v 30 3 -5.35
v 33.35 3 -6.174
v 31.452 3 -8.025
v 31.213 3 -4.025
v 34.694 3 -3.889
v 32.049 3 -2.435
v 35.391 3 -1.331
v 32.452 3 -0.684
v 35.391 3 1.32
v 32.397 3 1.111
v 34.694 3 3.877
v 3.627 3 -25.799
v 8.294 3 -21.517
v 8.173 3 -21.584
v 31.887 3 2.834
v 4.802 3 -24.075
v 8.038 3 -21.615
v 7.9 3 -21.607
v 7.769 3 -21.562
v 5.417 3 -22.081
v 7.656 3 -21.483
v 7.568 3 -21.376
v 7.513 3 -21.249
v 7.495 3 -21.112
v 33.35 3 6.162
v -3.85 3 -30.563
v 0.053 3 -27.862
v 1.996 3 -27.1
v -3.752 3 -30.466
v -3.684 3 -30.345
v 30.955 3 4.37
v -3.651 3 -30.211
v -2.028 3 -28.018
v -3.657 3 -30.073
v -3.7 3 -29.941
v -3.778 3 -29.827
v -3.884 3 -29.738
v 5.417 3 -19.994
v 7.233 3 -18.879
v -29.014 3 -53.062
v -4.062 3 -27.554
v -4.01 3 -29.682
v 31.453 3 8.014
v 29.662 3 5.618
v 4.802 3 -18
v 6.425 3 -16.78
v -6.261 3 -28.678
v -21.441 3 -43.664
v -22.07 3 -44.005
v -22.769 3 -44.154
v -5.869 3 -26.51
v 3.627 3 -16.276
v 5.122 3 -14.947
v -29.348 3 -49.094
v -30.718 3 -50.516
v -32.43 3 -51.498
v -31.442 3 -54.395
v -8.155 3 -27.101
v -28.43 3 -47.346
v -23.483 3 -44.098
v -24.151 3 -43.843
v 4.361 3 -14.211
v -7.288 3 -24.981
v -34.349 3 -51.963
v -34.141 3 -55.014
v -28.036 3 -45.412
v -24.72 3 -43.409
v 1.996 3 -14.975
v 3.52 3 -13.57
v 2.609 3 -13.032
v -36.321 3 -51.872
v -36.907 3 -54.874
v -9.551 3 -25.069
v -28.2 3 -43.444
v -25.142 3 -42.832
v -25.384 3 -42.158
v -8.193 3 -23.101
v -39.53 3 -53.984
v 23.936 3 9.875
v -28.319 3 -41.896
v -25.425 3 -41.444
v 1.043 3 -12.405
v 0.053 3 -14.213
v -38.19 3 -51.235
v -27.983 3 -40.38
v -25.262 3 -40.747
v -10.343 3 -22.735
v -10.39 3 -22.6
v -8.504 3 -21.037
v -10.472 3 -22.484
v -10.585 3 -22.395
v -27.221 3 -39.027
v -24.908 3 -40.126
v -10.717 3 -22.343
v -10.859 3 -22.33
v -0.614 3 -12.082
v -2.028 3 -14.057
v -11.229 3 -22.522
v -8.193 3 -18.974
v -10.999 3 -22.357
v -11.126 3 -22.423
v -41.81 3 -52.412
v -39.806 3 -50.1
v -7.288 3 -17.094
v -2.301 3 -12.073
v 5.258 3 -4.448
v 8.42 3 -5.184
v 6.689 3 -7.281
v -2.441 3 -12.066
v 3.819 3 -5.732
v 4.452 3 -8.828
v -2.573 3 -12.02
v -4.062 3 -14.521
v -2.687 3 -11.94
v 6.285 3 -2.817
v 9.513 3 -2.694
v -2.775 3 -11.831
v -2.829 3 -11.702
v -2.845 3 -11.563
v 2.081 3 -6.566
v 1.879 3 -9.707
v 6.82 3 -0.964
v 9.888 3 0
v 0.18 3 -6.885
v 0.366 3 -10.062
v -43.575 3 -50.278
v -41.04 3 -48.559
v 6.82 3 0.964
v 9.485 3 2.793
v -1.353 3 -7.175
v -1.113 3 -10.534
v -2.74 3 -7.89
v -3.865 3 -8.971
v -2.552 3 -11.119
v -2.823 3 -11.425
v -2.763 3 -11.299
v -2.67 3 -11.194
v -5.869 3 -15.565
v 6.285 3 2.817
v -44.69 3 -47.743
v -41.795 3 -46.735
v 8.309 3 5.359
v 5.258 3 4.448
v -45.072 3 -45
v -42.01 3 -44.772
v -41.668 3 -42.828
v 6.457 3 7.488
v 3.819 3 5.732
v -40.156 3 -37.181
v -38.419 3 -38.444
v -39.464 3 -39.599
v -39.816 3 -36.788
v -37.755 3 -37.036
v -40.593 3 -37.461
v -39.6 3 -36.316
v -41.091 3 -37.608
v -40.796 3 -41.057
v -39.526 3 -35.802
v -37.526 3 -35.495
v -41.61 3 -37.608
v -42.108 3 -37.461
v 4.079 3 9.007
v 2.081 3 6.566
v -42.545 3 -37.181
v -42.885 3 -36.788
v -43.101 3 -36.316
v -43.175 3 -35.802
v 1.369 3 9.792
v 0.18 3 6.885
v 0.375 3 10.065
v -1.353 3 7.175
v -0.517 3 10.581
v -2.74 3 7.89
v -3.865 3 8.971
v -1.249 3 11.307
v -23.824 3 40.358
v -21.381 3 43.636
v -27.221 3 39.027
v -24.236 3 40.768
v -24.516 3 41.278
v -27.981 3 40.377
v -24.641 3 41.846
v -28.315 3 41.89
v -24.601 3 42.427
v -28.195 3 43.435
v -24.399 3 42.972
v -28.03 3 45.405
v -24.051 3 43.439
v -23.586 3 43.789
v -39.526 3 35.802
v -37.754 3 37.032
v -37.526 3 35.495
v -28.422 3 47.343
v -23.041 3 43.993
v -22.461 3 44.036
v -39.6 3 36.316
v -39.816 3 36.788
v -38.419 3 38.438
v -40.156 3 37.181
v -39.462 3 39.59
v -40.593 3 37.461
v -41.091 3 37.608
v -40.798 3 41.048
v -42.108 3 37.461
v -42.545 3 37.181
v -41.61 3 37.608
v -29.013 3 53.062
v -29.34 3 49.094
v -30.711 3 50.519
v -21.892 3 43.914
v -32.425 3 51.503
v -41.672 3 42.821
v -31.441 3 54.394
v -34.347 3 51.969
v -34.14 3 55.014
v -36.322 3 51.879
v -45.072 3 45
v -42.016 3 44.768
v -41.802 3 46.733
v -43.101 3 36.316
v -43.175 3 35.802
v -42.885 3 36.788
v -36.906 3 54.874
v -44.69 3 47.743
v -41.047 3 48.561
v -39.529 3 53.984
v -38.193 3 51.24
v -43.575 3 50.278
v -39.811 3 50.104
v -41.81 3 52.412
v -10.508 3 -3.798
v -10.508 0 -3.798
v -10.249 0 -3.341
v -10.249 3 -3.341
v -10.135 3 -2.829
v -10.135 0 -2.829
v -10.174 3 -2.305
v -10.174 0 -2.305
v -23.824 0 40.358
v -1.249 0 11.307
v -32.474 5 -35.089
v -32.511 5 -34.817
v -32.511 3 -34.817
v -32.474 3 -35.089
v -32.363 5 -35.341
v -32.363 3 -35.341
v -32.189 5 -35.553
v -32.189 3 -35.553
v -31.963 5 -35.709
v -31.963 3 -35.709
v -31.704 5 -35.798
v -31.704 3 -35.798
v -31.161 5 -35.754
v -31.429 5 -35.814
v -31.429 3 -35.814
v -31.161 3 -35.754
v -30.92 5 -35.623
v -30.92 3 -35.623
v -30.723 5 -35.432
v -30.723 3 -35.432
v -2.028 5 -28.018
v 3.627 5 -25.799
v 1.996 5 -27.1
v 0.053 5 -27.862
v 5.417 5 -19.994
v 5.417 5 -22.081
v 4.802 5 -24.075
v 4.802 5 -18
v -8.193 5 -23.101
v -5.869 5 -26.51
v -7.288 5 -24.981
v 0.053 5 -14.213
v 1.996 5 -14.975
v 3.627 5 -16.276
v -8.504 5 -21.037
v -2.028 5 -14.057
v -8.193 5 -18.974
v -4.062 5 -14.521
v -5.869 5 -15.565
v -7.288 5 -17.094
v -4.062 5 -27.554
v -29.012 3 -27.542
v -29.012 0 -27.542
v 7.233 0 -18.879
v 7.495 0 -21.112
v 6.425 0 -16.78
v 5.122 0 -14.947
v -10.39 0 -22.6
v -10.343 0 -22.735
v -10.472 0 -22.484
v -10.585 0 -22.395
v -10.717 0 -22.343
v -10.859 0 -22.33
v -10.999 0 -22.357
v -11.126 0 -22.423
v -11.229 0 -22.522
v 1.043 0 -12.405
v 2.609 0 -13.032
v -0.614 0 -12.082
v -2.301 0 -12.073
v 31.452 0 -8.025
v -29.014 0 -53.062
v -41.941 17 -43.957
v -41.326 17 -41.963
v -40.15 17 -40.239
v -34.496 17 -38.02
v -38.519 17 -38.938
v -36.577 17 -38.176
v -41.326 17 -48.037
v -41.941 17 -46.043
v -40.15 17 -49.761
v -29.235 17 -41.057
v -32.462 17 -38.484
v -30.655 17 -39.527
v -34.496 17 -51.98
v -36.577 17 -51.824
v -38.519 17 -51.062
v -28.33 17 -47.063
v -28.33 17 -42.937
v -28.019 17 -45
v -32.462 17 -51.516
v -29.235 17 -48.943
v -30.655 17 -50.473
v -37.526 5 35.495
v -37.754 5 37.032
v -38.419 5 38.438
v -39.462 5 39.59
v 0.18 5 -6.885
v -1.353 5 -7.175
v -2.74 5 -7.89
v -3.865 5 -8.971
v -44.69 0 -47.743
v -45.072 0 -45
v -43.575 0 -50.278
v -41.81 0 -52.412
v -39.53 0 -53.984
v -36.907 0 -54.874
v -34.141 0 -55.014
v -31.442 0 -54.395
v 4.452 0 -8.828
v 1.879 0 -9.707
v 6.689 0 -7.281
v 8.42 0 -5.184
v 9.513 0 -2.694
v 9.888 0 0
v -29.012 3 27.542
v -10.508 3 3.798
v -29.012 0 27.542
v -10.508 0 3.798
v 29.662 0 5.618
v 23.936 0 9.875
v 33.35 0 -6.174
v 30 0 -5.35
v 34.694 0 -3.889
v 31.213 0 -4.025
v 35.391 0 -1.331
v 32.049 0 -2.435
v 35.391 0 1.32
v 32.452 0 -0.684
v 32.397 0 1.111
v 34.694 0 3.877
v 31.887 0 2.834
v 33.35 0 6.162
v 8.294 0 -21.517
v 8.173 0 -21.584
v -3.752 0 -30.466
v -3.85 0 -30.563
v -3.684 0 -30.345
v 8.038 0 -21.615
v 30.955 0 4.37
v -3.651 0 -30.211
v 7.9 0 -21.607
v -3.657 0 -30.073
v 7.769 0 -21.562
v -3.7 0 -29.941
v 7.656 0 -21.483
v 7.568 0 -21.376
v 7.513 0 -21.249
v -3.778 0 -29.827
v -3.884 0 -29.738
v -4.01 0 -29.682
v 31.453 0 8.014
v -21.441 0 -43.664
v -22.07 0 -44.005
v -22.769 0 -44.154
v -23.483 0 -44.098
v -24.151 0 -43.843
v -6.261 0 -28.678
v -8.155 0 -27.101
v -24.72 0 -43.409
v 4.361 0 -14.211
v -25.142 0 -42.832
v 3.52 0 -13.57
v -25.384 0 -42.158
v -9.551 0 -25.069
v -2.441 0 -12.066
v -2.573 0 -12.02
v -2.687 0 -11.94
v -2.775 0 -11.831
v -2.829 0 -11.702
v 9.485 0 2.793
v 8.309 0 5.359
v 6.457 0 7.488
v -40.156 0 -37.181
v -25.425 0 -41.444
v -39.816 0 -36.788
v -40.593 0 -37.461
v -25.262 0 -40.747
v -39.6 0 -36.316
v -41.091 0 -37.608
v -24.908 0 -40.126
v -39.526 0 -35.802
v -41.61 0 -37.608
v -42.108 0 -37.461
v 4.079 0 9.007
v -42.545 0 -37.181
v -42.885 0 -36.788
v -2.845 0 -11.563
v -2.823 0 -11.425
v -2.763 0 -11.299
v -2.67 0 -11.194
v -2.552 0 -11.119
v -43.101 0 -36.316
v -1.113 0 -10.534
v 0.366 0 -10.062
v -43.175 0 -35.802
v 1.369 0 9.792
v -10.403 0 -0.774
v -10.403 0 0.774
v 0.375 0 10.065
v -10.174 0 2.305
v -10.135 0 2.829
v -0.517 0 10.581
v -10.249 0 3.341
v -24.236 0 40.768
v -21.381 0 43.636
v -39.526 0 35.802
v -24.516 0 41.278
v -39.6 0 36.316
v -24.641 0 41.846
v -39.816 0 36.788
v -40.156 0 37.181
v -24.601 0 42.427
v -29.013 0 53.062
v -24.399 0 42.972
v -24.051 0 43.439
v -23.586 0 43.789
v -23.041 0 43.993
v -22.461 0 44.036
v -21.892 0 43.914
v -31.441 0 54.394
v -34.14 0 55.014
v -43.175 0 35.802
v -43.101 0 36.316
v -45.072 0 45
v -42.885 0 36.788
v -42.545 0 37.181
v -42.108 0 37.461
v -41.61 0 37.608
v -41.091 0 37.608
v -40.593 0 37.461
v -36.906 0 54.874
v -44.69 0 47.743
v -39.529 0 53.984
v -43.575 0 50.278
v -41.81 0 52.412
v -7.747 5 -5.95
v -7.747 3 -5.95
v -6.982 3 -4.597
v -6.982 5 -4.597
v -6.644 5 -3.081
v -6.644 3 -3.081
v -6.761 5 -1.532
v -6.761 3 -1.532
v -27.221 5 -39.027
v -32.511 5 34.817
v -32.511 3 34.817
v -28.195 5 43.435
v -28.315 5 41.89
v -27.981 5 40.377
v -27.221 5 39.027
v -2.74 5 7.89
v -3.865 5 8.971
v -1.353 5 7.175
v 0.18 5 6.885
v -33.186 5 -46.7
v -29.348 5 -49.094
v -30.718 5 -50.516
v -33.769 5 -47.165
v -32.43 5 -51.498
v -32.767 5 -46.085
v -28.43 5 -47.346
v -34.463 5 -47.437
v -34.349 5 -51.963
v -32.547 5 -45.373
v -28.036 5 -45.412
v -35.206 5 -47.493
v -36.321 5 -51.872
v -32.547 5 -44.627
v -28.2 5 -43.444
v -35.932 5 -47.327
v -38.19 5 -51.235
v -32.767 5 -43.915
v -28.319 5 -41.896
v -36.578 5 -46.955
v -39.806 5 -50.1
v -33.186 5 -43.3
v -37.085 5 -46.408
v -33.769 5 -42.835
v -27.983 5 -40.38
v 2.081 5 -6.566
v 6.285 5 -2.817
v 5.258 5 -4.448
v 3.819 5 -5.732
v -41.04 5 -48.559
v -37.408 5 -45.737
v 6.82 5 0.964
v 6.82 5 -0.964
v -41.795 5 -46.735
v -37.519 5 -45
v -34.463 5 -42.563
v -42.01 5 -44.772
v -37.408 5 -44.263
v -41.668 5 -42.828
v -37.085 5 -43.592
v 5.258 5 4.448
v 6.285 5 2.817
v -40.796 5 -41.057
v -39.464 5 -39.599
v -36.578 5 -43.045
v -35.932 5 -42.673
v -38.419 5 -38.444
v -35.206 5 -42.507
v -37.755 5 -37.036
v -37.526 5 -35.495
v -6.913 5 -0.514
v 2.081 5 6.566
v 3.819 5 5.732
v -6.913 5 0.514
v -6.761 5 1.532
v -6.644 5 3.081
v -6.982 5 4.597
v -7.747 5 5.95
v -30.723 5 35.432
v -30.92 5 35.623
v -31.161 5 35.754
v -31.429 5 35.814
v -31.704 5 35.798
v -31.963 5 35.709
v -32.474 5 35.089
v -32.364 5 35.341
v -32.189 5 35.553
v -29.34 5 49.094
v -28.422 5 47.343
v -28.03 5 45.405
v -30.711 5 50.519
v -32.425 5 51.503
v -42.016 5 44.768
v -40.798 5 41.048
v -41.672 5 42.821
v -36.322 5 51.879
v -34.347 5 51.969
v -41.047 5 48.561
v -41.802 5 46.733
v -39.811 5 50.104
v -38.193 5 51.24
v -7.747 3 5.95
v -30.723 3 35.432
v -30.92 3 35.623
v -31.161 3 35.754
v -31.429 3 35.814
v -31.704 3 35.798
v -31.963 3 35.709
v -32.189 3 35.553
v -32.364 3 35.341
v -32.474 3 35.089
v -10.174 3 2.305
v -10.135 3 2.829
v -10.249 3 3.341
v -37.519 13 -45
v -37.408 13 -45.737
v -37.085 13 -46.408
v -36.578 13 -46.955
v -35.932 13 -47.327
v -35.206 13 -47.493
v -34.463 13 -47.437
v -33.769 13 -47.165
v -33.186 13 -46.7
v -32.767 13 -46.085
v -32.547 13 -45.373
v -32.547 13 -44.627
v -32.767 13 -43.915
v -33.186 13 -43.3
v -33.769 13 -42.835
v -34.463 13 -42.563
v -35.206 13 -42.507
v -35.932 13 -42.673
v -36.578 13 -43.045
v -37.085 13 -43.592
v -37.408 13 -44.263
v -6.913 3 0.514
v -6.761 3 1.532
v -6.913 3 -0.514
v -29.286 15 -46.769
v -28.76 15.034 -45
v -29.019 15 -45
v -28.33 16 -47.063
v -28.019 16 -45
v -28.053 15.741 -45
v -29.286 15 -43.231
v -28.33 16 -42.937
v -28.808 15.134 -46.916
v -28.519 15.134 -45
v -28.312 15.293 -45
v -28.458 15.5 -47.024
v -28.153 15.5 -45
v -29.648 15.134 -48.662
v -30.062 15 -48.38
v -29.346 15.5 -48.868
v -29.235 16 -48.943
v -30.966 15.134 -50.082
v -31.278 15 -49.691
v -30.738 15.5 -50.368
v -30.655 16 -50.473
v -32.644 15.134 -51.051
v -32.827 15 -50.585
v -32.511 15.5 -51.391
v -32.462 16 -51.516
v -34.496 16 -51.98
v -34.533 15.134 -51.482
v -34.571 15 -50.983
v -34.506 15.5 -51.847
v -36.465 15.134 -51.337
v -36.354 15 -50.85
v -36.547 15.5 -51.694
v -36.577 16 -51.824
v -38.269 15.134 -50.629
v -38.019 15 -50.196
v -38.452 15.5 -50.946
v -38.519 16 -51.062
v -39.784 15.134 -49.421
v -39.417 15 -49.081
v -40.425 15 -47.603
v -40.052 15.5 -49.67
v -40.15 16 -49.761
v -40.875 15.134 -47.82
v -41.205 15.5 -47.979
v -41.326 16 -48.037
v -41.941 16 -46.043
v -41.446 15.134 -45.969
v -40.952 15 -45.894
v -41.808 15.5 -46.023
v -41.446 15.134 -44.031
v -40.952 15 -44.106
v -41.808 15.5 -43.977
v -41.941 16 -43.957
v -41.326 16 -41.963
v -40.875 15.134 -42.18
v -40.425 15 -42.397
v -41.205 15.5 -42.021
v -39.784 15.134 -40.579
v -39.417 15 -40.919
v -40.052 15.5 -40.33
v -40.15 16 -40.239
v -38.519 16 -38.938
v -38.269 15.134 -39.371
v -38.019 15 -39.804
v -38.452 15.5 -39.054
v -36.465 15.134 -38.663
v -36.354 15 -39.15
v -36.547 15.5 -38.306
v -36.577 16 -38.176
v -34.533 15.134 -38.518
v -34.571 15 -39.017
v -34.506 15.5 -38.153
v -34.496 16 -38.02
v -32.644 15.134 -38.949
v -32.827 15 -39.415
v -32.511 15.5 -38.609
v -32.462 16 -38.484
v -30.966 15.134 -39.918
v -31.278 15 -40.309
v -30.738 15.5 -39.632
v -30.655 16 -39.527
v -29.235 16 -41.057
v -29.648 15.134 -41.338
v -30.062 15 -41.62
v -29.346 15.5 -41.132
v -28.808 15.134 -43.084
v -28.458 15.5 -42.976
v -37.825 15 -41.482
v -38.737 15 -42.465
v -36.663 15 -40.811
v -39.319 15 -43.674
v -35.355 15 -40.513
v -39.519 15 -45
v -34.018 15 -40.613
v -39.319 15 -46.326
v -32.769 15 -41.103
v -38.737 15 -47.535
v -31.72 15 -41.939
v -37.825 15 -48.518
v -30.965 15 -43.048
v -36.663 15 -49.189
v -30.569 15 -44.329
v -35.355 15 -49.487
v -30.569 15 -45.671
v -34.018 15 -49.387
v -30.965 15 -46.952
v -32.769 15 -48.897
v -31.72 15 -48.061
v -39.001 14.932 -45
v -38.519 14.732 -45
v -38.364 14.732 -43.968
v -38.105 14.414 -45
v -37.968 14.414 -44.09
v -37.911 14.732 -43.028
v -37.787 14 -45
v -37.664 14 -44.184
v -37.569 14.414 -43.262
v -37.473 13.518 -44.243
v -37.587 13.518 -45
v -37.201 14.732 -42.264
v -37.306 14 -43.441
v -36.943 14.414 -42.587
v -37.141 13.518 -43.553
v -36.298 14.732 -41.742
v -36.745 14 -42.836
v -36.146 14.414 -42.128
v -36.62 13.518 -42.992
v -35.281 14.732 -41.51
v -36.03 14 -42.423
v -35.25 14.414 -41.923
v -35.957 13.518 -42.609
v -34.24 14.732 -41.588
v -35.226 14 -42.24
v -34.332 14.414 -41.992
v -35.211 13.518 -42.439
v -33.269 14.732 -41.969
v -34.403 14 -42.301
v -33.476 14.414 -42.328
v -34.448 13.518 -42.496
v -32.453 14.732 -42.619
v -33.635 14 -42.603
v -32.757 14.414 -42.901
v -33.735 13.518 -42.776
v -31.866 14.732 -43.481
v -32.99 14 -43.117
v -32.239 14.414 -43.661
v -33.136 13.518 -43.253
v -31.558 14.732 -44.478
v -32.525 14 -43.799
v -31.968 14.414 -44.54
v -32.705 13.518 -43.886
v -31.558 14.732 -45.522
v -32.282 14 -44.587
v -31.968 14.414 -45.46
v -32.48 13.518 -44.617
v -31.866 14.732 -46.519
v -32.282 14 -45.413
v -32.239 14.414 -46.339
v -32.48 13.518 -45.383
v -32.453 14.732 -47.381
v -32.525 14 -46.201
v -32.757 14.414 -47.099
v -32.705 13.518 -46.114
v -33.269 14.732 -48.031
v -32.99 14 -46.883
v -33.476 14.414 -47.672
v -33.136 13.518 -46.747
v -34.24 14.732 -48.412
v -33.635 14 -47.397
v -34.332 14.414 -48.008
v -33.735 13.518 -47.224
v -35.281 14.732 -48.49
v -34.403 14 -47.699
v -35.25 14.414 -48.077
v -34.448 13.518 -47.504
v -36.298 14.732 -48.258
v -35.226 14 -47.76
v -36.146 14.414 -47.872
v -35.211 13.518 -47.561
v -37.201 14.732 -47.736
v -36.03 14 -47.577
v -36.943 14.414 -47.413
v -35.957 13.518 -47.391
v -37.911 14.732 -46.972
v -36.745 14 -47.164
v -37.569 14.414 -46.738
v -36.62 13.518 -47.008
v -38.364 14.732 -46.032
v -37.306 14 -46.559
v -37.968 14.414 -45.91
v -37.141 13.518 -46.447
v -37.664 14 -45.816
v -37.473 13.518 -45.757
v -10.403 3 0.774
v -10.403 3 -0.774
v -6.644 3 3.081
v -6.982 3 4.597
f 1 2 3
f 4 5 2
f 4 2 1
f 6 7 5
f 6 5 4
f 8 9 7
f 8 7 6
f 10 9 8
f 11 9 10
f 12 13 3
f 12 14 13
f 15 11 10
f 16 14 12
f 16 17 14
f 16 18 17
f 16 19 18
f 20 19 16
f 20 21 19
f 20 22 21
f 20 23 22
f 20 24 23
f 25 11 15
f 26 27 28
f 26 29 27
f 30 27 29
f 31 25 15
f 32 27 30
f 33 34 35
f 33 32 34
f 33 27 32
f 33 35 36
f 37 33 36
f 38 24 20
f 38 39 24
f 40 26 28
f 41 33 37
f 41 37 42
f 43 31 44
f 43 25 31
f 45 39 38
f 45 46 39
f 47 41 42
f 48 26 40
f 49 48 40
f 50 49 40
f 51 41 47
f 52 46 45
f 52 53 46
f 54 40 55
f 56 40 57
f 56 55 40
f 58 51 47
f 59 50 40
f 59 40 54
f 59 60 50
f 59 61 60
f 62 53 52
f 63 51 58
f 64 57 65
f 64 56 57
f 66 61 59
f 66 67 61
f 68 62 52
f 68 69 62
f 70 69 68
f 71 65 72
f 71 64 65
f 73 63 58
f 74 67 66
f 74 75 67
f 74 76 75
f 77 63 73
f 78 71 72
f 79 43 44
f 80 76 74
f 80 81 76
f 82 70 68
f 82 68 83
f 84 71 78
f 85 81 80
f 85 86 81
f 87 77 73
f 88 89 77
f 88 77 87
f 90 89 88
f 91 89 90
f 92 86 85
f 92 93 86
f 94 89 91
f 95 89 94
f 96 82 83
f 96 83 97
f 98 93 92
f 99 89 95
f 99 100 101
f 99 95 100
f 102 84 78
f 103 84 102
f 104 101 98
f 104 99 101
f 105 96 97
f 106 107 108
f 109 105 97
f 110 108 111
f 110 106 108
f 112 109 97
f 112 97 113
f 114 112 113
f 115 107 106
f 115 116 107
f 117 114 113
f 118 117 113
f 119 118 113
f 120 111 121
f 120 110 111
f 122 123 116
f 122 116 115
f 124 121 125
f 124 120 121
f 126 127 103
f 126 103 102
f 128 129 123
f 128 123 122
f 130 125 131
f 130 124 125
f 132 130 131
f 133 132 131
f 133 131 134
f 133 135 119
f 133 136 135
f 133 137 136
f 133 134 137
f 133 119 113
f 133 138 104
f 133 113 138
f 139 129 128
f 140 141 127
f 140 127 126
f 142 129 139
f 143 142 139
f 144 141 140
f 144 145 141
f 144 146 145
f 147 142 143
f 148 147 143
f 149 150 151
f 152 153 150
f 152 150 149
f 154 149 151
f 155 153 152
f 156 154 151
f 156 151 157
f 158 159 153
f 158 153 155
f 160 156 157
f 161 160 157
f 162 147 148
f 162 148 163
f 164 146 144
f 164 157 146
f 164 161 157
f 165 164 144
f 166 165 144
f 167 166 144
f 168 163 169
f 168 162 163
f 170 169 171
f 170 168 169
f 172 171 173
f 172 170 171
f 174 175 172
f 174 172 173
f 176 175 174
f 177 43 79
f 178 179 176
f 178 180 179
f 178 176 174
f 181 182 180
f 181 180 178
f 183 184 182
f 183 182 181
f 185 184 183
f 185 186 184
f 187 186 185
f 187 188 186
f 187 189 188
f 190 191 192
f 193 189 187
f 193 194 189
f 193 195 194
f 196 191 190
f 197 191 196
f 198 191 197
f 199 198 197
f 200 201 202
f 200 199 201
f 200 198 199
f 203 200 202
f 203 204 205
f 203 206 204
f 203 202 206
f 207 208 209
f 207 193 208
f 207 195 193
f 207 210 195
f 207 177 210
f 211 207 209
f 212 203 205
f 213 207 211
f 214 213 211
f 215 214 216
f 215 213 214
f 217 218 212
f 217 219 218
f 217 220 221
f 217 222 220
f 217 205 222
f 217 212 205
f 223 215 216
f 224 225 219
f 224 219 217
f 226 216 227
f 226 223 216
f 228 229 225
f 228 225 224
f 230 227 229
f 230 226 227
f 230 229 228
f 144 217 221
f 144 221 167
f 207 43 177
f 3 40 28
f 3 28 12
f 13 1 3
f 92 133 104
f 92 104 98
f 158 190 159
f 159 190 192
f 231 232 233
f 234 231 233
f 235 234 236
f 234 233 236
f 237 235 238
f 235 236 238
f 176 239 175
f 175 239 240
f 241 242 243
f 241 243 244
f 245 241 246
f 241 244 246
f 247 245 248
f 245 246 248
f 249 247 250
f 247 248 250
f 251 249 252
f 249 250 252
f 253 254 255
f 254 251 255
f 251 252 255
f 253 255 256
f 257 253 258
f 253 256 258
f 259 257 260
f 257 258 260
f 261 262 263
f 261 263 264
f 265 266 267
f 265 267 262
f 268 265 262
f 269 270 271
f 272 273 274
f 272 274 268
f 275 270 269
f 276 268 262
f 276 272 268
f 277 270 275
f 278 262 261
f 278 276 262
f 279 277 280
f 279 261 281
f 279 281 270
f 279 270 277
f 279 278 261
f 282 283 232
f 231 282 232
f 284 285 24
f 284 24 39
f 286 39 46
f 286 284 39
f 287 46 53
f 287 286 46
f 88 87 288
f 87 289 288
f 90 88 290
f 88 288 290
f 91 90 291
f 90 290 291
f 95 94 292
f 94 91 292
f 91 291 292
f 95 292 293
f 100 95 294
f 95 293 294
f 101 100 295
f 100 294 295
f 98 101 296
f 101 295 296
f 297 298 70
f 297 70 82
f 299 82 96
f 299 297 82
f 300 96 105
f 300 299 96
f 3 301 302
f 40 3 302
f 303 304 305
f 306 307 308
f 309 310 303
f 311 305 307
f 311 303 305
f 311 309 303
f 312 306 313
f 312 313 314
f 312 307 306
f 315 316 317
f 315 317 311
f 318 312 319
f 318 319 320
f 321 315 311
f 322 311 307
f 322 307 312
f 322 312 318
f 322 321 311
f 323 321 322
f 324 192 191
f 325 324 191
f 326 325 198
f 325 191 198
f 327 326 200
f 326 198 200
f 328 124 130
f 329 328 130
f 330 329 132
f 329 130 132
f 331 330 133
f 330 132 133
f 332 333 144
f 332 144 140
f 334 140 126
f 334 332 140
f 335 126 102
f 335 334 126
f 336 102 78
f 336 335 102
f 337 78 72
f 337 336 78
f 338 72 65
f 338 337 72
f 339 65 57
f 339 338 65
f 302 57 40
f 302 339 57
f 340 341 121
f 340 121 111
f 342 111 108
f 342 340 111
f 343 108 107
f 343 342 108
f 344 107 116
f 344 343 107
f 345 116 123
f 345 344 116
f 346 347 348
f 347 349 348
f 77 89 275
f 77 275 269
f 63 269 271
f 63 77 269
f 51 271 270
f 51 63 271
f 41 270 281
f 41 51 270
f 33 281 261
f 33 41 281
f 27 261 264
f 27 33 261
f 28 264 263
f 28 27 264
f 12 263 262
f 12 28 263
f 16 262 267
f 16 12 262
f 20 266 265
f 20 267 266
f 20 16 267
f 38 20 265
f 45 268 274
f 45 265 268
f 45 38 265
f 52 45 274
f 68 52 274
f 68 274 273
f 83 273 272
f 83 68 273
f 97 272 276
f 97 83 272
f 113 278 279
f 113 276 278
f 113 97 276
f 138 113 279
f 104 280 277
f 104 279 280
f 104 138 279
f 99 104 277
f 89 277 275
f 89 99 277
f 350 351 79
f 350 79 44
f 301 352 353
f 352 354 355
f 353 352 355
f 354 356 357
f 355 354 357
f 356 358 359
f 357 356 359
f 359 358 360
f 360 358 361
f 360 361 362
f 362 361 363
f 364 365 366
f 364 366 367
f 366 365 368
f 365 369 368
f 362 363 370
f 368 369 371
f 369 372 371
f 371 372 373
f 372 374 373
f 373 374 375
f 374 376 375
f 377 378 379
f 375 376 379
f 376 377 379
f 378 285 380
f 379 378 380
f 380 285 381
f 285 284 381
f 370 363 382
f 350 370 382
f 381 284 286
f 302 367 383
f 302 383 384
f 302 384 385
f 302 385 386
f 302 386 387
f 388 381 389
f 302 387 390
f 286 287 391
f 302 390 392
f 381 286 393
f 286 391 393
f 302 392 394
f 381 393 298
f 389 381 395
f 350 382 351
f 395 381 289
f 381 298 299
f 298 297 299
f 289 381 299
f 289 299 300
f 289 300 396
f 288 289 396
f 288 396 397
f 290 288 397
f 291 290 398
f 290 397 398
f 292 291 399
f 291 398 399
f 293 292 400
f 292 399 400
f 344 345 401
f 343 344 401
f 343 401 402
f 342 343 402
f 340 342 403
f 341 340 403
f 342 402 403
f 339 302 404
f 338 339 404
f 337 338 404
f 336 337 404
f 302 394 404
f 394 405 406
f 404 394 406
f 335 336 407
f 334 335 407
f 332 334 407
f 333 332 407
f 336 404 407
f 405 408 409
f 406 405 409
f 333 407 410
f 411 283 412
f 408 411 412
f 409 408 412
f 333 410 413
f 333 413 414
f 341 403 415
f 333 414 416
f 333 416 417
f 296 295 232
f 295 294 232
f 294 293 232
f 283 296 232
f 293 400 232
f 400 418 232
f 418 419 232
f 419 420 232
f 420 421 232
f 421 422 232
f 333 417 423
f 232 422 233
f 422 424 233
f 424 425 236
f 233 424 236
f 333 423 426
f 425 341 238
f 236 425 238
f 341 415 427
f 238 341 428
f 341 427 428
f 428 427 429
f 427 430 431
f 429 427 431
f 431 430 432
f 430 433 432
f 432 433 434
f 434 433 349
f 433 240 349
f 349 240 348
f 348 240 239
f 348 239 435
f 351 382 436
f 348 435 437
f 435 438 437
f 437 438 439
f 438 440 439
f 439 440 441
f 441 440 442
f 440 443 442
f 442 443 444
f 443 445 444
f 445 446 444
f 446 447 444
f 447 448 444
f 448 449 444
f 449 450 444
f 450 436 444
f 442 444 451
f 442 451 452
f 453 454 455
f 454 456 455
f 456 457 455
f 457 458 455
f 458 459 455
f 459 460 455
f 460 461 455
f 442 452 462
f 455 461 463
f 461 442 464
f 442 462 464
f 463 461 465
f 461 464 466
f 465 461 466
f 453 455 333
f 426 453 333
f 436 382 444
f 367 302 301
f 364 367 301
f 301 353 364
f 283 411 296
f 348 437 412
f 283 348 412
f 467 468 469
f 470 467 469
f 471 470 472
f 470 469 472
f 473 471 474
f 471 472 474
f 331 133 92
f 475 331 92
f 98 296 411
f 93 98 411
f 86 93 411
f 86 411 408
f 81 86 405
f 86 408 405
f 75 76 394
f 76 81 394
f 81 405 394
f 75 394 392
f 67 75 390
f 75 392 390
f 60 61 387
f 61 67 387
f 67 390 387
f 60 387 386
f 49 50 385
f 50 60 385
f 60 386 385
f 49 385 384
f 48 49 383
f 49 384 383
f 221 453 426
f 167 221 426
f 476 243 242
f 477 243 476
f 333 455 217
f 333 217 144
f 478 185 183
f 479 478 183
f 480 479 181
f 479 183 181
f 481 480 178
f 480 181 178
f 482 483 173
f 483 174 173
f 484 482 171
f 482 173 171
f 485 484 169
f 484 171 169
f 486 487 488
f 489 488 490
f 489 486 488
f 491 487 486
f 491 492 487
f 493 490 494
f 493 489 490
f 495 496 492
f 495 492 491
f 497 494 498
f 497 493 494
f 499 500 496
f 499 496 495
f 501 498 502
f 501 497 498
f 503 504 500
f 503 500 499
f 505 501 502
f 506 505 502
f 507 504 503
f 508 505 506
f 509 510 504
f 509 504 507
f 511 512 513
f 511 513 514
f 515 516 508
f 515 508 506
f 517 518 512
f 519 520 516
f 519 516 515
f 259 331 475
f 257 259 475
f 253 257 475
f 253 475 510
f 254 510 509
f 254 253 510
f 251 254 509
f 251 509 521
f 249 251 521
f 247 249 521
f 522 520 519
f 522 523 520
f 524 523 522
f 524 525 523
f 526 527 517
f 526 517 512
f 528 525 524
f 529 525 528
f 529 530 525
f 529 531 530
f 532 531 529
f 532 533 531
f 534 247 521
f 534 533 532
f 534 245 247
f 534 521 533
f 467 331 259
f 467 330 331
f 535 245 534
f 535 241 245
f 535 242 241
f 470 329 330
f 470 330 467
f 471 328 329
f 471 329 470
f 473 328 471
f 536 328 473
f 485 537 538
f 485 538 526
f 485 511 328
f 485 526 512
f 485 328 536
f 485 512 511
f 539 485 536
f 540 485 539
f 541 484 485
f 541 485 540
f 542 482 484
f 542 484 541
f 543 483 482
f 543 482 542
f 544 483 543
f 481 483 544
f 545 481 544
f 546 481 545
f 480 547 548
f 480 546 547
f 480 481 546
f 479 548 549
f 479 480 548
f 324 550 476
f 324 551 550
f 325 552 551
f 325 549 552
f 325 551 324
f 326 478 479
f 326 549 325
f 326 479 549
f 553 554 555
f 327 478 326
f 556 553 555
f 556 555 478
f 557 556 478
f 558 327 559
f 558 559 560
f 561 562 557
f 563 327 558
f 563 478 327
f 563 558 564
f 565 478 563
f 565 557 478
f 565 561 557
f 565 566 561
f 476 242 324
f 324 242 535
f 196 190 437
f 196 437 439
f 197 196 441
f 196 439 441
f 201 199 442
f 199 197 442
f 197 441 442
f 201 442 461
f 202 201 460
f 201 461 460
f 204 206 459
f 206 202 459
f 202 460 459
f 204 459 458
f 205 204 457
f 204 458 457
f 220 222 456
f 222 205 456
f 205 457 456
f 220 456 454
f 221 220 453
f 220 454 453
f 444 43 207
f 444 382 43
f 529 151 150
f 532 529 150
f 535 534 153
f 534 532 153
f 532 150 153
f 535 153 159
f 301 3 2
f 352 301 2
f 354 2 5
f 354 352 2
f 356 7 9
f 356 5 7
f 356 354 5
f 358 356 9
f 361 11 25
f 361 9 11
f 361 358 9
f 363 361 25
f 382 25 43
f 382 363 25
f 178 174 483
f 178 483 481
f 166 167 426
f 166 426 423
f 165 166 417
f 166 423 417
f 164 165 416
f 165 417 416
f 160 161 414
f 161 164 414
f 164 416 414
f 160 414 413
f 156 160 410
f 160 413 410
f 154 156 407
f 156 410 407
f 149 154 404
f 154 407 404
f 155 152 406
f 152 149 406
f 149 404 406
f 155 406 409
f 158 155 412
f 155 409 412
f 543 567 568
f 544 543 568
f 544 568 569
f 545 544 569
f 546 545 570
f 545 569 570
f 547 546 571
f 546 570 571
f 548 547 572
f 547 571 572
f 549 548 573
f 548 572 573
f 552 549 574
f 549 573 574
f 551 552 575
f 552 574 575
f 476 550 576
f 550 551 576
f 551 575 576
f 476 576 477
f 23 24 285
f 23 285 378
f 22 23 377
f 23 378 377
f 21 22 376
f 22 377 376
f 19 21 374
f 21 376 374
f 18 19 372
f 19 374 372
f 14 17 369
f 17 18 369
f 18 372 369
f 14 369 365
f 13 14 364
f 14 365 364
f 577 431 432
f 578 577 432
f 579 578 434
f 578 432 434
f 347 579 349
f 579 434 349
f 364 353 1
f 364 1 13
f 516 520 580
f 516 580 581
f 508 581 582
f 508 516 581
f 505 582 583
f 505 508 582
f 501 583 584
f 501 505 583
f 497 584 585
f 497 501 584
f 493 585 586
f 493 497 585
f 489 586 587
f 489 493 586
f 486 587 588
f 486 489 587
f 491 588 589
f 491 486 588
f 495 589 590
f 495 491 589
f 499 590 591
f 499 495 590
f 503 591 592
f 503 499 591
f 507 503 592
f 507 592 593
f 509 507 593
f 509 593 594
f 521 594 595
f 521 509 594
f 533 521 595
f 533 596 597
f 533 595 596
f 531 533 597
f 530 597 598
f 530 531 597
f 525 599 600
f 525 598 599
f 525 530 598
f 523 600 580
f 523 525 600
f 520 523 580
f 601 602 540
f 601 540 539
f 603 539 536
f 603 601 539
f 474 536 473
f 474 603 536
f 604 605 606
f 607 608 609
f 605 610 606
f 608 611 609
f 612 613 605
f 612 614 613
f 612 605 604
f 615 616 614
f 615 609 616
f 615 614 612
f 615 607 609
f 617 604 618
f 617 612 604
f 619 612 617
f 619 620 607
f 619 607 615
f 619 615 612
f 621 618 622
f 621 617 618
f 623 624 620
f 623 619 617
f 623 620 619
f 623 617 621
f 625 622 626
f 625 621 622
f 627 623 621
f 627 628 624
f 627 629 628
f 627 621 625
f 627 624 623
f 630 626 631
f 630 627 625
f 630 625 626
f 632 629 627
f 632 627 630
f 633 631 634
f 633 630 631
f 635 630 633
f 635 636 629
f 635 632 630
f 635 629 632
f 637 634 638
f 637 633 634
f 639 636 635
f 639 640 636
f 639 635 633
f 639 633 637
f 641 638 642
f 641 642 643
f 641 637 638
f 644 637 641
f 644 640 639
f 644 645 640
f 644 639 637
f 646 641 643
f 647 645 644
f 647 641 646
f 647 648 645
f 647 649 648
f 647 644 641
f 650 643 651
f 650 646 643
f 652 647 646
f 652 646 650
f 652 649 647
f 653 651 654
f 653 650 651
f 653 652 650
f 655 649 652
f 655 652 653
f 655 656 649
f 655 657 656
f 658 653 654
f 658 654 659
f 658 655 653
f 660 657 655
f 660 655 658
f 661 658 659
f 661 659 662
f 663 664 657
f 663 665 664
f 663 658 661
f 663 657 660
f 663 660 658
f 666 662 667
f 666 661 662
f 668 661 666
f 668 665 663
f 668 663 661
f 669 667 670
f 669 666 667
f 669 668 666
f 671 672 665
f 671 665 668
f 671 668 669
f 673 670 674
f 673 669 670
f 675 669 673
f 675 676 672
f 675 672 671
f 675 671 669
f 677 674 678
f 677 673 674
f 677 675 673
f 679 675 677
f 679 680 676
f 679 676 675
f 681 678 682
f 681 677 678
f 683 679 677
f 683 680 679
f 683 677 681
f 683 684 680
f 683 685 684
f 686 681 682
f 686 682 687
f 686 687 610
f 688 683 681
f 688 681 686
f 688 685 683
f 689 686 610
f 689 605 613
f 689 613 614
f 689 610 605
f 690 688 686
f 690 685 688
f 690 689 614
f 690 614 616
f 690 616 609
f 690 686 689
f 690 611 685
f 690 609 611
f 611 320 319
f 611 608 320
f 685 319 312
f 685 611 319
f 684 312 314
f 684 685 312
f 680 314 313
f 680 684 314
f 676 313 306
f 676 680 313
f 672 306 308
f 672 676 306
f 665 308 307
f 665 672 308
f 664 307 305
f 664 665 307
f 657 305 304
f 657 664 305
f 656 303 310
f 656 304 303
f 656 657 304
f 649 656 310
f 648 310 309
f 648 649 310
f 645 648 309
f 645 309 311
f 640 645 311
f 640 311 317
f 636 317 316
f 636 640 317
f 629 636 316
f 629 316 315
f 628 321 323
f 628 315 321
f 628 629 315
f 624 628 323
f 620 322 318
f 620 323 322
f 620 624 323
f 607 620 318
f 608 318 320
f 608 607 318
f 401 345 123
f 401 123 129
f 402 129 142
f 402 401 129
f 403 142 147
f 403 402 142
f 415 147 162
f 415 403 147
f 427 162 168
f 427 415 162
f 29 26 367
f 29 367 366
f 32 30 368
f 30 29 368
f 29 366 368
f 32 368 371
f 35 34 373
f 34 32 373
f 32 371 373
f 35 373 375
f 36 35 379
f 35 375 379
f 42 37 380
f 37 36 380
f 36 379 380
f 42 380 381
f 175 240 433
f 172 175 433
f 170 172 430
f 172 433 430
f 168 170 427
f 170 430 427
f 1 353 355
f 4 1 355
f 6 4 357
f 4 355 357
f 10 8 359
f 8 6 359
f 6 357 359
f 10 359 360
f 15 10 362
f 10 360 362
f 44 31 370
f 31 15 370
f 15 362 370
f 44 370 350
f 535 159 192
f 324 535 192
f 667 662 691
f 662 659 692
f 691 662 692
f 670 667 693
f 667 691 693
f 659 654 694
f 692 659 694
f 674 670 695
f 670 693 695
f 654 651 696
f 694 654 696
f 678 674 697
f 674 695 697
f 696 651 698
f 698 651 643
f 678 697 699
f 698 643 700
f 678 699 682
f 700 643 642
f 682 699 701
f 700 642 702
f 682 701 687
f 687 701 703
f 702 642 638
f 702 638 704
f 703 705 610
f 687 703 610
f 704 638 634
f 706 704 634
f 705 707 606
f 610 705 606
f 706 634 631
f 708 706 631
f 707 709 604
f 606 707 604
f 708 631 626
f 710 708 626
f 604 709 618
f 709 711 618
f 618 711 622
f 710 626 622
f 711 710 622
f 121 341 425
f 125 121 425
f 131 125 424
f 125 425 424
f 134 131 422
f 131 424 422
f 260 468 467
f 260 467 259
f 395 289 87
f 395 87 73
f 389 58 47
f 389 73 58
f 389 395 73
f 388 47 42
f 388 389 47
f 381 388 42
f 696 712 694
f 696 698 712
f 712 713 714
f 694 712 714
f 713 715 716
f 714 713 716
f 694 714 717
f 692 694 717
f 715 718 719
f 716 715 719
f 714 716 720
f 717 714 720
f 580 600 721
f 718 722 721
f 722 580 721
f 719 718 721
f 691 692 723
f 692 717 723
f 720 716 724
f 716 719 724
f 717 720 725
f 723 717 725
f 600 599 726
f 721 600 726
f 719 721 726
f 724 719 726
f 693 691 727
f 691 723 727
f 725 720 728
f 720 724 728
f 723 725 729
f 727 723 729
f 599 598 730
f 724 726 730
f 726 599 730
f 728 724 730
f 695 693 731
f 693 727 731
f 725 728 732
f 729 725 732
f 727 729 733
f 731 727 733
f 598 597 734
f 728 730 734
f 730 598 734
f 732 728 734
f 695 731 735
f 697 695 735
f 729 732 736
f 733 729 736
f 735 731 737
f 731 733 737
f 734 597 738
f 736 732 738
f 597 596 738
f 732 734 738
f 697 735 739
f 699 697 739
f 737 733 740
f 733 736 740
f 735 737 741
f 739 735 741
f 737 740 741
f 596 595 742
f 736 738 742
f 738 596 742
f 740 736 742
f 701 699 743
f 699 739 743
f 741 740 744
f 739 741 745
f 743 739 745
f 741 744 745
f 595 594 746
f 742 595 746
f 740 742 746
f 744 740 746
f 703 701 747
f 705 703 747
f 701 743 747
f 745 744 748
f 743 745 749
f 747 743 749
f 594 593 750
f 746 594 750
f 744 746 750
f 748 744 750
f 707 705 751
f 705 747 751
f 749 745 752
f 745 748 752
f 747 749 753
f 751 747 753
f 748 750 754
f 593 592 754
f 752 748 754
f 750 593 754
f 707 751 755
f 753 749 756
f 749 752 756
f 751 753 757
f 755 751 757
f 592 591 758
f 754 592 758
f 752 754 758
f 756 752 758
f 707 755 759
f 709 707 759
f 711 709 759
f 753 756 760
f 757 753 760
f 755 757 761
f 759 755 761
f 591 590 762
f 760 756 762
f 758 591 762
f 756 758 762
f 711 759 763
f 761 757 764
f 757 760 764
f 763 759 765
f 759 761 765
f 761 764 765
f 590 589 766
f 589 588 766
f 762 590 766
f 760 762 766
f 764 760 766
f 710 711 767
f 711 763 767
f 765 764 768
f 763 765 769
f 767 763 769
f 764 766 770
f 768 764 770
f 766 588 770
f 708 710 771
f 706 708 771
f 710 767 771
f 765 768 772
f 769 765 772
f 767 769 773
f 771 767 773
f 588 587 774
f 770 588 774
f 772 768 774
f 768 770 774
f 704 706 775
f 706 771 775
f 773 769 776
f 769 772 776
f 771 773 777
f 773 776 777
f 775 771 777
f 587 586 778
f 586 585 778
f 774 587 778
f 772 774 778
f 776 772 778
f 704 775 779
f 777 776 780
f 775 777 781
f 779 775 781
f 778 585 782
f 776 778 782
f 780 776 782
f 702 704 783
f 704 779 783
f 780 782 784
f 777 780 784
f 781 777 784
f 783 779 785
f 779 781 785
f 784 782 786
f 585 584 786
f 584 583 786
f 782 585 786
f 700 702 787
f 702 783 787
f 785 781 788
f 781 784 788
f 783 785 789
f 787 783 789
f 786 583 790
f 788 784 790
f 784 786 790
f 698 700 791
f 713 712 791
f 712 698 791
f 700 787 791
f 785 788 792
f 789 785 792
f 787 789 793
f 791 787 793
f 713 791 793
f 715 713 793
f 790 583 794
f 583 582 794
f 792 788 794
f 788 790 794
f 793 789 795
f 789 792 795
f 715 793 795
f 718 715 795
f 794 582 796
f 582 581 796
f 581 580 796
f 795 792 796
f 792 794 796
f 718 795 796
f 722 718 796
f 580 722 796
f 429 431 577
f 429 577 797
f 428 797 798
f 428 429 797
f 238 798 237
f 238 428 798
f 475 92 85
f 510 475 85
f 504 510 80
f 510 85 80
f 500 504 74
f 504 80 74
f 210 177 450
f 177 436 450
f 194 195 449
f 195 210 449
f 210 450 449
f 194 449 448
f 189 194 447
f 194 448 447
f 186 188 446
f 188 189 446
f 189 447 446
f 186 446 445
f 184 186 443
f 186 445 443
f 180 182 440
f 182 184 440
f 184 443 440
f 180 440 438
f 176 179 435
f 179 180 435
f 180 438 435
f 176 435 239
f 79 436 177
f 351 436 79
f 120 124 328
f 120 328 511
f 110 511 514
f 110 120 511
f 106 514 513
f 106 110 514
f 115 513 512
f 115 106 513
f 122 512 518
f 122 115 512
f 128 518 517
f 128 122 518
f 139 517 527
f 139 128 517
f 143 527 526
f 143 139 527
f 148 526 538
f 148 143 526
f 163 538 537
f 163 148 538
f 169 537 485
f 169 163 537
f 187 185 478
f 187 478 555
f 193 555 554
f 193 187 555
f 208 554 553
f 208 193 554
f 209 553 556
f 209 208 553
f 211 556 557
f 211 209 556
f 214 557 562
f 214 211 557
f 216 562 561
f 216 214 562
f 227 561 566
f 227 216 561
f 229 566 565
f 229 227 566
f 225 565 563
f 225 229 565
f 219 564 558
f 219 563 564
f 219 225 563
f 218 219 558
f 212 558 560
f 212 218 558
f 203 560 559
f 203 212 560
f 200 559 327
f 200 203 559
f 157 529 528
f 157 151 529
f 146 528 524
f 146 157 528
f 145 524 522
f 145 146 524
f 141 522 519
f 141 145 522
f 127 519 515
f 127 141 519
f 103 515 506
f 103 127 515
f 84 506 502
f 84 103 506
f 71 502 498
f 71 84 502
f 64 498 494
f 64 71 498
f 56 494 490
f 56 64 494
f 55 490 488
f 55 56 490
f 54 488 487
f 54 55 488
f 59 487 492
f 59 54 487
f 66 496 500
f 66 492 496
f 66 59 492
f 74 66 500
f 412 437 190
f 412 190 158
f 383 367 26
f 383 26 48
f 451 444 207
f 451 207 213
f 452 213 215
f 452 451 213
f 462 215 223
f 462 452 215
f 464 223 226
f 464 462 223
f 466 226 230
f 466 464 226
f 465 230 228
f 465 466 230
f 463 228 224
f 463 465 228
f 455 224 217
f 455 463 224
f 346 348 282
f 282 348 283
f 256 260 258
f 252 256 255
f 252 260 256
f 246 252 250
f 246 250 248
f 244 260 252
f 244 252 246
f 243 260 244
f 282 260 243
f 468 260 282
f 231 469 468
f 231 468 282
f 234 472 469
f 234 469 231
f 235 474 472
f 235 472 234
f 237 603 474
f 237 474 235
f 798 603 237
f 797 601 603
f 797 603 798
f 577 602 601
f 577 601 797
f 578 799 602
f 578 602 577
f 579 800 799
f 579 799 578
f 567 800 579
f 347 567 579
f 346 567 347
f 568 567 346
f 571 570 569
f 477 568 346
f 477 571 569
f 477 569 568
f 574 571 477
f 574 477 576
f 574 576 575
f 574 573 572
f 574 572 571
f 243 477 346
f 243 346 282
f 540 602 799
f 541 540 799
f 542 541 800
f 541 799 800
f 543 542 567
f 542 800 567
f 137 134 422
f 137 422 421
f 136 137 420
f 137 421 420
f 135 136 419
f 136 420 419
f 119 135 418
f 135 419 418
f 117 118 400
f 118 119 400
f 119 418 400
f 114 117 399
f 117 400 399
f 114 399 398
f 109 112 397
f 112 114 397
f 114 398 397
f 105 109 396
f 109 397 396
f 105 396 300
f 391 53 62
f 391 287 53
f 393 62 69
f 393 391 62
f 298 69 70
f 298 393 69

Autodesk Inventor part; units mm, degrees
ref_plane "YZ Plane" through (0, 0, 0) normal (1, 0, 0) x (0, 1, 0)
ref_plane "XZ Plane" through (0, 0, 0) normal (0, 1, 0) x (-1, 0, 0)
ref_plane "XY Plane" through (0, 0, 0) normal (0, 0, 1) x (1, 0, 0)
sketch "Boceto1" plane through (0, 0, 0) normal (0, 1, 0) x (-1, 0, 0)
  circle A0 centre (1.5044, -21.0374) radius 7
  line L0 (0, 0) -> (-30, 0) construction
  line L1 (0, 0) -> (35.019, 45) construction
  arc A1 (45.0717, 45) -> (29.0132, 53.0615) centre (35.019, 45) ccw
  arc A2 (28.1996, -43.444) -> (39.4639, -39.5994) centre (35.019, -45) ccw
  arc A3 (29.0141, -53.0621) -> (45.0717, -45) centre (35.019, -45) ccw
  line L2 (45.0717, 45) -> (45.0717, -45)
  line L3 (-31.4523, -8.0252) -> (29.0141, -53.0621)
  line L4 (-31.4532, 8.0139) -> (29.0132, 53.0615)
  circle A4 centre (35.019, -45) radius 2.5
  line L5 (35.019, 45) -> (35.019, -45) construction
  line L6 (0, 0) -> (35.019, -45) construction
  arc A5 (39.4623, 39.5898) -> (28.1951, 43.4351) centre (35.019, 45) ccw
  line L7 (37.5264, -35.4953) -> (37.5264, 35.4947)
  line L8 (32.5115, -34.8171) -> (32.5115, 34.8171)
  line L9 (4.23, 5.4356) -> (6.2005, 3.9021) construction
  line L10 (7.7468, 5.9499) -> (30.7228, 35.4318)
  line L11 (3.8646, 8.971) -> (27.2206, 39.0273)
  line L12 (7.7468, -5.9499) -> (30.7228, -35.4318)
  line L13 (3.8646, -8.971) -> (27.2206, -39.0273)
  arc A6 (32.5115, 34.8171) -> (30.7228, 35.4318) centre (31.5115, 34.8171) ccw
  arc A7 (30.7228, -35.4318) -> (32.5115, -34.8171) centre (31.5115, -34.8171) ccw
  arc A8 (27.2206, 39.0273) -> (28.1951, 43.4351) centre (23.063, 42.2581) ccw
  arc A9 (-0.1798, 6.8852) -> (3.8646, 8.971) centre (-0.4077, 12.2909) ccw
  arc A10 (7.7468, 5.9499) -> (6.7608, 1.532) centre (11.9166, 2.7002) ccw
  arc A11 (6.7608, -1.532) -> (7.7468, -5.9499) centre (11.9166, -2.7002) ccw
  arc A12 (3.8646, -8.971) -> (-0.1798, -6.8852) centre (-0.4077, -12.2909) ccw
  arc A13 (6.7608, -1.532) -> (6.7608, 1.532) centre (0, 0) ccw
  arc A14 (-0.1798, 6.8852) -> (-0.1798, -6.8852) centre (0, 0) ccw
  arc A15 (39.4623, 39.5898) -> (37.5264, 35.4947) centre (42.8256, 35.4947) ccw
  arc A16 (37.5264, -35.4953) -> (39.4639, -39.5994) centre (42.8417, -35.4953) ccw
  arc A17 (28.1996, -43.444) -> (27.2206, -39.0273) centre (23.0492, -42.2688) ccw
  arc A18 (-31.4532, 8.0139) -> (-31.4523, -8.0252) centre (-25.4789, -0.0053) ccw
  line L14 (29.0115, 27.5422) -> (29.0115, -27.5422)
  line L15 (29.0115, -27.5422) -> (10.5075, -3.7984)
  arc A19 (10.1743, -2.3054) -> (10.5075, -3.7984) centre (11.9166, -2.7002) ccw
  arc A20 (10.1743, -2.3054) -> (10.1743, 2.3054) centre (0, 0) ccw
  arc A21 (10.5075, 3.7984) -> (10.1743, 2.3054) centre (11.9166, 2.7002) ccw
  line L16 (10.5075, 3.7984) -> (29.0115, 27.5422)
  line L17 (39.5264, 35.8019) -> (39.5264, -35.8019)
  line L18 (40.8447, 38.0421) -> (40.8447, -38.1418) construction
  line L19 (21.3809, 43.6361) -> (-23.936, 9.8749)
  arc A22 (23.8235, 40.3575) -> (21.3809, 43.6361) centre (22.6022, 41.9968) ccw
  arc A23 (-1.3686, 9.7923) -> (-9.8875, 0) centre (0, 0) ccw
  line L20 (23.8235, 40.3575) -> (1.2488, 11.3067)
  arc A24 (-1.3686, 9.7923) -> (1.2488, 11.3067) centre (-1.9249, 13.773) ccw
  arc A25 (-29.6624, 5.6176) -> (-29.9588, -5.3847) centre (-25.486, 0) ccw
  line L21 (-23.936, 9.8749) -> (-29.6624, 5.6176)
  arc A26 (-9.8875, 0) -> (-1.8786, -9.7074) centre (0, 0) ccw
  line L22 (43.1749, 35.8019) -> (43.1749, -35.8019)
  arc A27 (43.1749, 35.8019) -> (39.5264, 35.8019) centre (41.3506, 35.8019) ccw
  arc A28 (39.5264, -35.8019) -> (43.1749, -35.8019) centre (41.3506, -35.8019) ccw
  line L23 (-30, -5.3501) -> (-8.2939, -21.5174)
  arc A29 (2.552, -11.1194) -> (-1.8786, -9.7074) centre (-5.6513, -29.2032) ccw
  arc A30 (2.3012, -12.0728) -> (2.552, -11.1194) centre (2.3454, -11.5747) ccw
  arc A31 (-8.2939, -21.5174) -> (-7.4953, -21.1122) centre (-7.9953, -21.1164) ccw
  line L24 (11.2288, -22.5221) -> (24.908, -40.1255)
  line L25 (3.8504, -30.5629) -> (21.4406, -43.6644)
  arc A32 (21.4406, -43.6644) -> (24.908, -40.1255) centre (22.9339, -41.6595) ccw
  arc A33 (2.3012, -12.0728) -> (-2.6092, -13.0325) centre (1.5044, -21.0374) ccw
  arc A34 (-5.1216, -14.9468) -> (-7.4953, -21.1122) centre (1.5044, -21.0374) ccw
  arc A35 (2.3012, -12.0728) -> (-7.4953, -21.1122) centre (1.5044, -21.0374) ccw
  arc A36 (4.0099, -29.6816) -> (10.3429, -22.7346) centre (1.5044, -21.0374) ccw
  arc A37 (11.2288, -22.5221) -> (10.3429, -22.7346) centre (10.834, -22.8289) ccw
  arc A38 (4.0099, -29.6816) -> (3.8504, -30.5629) centre (4.1491, -30.1619) ccw
  point P0 (31.1449, 35.9734)
  point P1 (32.5115, 35.4947)
  point P2 (32.5115, -35.4953)
  point P3 (32.5115, 35.4947)
  point P4 (31.1449, -35.9734)
  point P5 (-3.2933, -26.1347)
  point P6 (8.3262, -19.468)
  point P7 (-7.4247, -22.1648)
  point P8 (10.4887, -21.5697)
  point P9 (2.9812, -29.9154)
  point P10 (-2.6092, -13.0325)
  dimension "d0" = 14
  dimension "d1" = 45
  dimension "d2" = 5
  dimension "d3" = 1
  dimension "d4" = 10
  dimension "d5" = 3.5
  dimension "d6" = 2
  dimension "d7" = 3
  dimension "d8" = 14
  dimension "d20" = 0.5
  dimension "d23" = 2.5
  dimension "d24" = 2.5
  dimension "d25" = 0.5
extrude "Extrusión2" add sketch "Boceto1" along normal blind 5 contours A0 | A17 L13 A12 A14 A9 L11 A8 A5 A15 L7 A16 A2
extrude "Extrusión3" add sketch "Boceto1" along normal blind 15 contours A4
extrude "Extrusión4" add sketch "Boceto1" along normal blind 3 contours L2 A3 L3 A18 L4 A1
extrude "Extrusión5" add sketch "Boceto1" along normal blind 3 contours A7 L12 A11 A13 A10 L10 A6 L8
sketch "Boceto2" plane through (-35.019, 15, -45) normal (0, 1, 0) x (1, 0, 0)
  circle A0 centre (0, 0) radius 7
  point P0 (35.019, -45)
  dimension "d30" = 14
extrude "Extrusión6" add sketch "Boceto2" along normal blind 2
fillet "Empalme1" radius 2 1 edges at (-32.519, 15, -45)
fillet "Empalme2" radius 1 1 edges at (-42.019, 15, -45)
properties part number "prot2"
